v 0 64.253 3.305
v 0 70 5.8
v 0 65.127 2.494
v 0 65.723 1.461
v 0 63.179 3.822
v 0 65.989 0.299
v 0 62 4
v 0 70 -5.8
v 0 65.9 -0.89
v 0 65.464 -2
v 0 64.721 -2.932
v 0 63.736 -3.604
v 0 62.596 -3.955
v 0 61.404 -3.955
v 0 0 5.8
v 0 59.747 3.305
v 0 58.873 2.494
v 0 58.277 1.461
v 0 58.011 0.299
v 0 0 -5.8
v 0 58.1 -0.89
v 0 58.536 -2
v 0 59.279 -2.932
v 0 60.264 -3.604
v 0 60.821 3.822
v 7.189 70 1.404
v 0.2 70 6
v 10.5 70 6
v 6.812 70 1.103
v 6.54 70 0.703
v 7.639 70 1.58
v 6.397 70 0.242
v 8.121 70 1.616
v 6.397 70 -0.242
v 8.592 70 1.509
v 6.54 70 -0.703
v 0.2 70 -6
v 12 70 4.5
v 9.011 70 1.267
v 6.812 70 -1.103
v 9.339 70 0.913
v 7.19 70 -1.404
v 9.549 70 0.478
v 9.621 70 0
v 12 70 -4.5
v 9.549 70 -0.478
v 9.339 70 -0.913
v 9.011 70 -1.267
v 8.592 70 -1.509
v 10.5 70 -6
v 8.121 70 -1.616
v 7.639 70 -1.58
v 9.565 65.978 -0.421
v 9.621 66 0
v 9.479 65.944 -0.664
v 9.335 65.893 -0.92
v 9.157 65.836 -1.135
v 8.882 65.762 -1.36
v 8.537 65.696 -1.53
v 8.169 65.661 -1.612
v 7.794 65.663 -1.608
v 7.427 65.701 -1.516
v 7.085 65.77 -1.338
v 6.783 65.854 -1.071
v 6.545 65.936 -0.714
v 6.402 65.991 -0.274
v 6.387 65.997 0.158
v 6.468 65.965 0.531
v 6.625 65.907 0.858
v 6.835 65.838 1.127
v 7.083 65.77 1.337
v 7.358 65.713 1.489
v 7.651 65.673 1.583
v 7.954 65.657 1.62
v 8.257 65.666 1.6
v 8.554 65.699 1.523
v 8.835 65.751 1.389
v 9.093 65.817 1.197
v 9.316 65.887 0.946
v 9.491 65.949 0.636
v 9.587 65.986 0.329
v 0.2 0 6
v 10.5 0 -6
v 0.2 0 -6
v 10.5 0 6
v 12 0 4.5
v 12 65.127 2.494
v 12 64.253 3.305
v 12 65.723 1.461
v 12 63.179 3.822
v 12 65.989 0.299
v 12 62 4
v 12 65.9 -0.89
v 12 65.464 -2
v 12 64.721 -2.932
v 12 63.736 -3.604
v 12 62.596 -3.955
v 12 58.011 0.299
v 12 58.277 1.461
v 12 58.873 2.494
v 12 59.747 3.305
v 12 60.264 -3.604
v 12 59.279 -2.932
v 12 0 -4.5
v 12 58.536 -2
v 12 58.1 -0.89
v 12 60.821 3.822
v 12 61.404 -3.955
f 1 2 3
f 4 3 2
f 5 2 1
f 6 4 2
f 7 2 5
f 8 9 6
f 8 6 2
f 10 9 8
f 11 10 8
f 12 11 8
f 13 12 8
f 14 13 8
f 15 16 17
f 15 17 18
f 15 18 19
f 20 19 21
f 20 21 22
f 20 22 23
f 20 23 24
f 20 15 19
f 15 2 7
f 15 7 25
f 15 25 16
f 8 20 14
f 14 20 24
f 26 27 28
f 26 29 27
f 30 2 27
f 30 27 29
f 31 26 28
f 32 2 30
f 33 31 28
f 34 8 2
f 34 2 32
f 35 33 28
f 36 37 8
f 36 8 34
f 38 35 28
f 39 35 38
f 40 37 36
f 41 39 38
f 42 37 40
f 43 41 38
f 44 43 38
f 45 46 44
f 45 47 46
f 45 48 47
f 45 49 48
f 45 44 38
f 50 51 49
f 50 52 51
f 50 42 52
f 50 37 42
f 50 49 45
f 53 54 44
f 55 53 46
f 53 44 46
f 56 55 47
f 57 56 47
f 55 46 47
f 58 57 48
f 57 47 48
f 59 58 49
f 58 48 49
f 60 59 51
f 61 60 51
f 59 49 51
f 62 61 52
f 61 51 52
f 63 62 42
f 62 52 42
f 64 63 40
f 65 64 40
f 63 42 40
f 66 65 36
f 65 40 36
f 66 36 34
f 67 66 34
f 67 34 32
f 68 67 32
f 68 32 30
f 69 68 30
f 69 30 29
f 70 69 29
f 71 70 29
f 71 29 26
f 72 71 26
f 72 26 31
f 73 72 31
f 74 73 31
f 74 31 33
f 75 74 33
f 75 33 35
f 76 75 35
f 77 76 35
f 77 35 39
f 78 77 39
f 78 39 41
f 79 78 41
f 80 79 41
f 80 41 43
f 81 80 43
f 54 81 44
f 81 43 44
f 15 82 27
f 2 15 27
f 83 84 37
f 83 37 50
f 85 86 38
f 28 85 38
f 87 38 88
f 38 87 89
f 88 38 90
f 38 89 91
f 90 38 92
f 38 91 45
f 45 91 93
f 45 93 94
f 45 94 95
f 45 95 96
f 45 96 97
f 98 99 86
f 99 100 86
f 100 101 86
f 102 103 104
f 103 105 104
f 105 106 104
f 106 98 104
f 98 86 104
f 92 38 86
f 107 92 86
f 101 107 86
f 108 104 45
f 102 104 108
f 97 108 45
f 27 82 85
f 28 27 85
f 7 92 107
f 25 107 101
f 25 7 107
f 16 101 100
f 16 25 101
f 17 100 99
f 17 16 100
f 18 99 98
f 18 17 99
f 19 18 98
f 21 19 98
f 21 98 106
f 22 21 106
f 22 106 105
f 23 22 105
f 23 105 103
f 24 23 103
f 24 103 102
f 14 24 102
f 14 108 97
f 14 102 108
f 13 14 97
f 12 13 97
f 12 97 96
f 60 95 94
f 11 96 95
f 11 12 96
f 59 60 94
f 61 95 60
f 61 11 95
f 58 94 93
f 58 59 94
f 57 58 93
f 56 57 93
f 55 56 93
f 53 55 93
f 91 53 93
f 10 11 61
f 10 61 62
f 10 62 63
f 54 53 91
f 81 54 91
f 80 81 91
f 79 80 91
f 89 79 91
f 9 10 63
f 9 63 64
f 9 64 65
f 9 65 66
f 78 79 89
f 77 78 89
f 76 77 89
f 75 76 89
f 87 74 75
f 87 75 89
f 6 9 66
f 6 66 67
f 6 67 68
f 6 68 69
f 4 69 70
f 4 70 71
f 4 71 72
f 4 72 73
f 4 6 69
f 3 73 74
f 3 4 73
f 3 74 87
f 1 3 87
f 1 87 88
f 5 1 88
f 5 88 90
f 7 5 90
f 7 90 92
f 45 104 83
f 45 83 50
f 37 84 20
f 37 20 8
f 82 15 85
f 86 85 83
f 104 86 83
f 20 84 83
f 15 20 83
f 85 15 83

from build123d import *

# Parameters (mm, degrees)
SKETCH1_W           = 12
SKETCH1_H           = 12
BOSS_EXTRUDE1_DEPTH = 70
CHAMFER1_SIZE       = 0.2
CHAMFER2_SIZE       = 1.5
SKETCH2_R           = 4
CUT_EXTRUDE1_DEPTH  = 72.274118725
TAP1_REACH          = 73.274
TAP1_BORE_R         = 1.621


with BuildPart() as part:
    # Sketch1 → Boss-Extrude1 (new body)
    with BuildSketch(Plane(origin=(0, 0, 0), x_dir=(1, 0, 0), z_dir=(0, 1, 0))):
        with Locations((6, 0)):
            Rectangle(SKETCH1_W, SKETCH1_H)
    extrude(amount=BOSS_EXTRUDE1_DEPTH)

    # Chamfer1
    chamfer1_edges = [part.edges().sort_by_distance(p)[0] for p in [
        (0, 35, 6),
        (0, 35, -6),
    ]]
    chamfer(chamfer1_edges, length=CHAMFER1_SIZE)

    # Chamfer2
    chamfer2_edges = [part.edges().sort_by_distance(p)[0] for p in [
        (12, 35, -6),
        (12, 35, 6),
    ]]
    chamfer(chamfer2_edges, length=CHAMFER2_SIZE)

    # Sketch2 → Cut-Extrude1 (cut, through all)
    with BuildSketch(Plane(origin=(0, 0, 0), x_dir=(0, 0, -1), z_dir=(1, 0, 0))):
        with Locations(Location((0, 62, 0), (0, 0, 180))):
            Circle(SKETCH2_R)
    extrude(amount=CUT_EXTRUDE1_DEPTH, mode=Mode.SUBTRACT)

    # Tap1 bore → Tap1 (cut, up to next)
    with BuildSketch(Plane(origin=(0, 70, 0), x_dir=(1, 0, 0), z_dir=(0, 1, 0)), mode=Mode.PRIVATE) as tap1_sk1:
        with Locations((8, 0)):
            Circle(TAP1_BORE_R)
    tap1_tool1 = extrude(tap1_sk1.sketch, amount=-TAP1_REACH, mode=Mode.PRIVATE) & part.part
    add(tap1_tool1.solids().sort_by_distance((8, 70, 0))[0], mode=Mode.SUBTRACT)


solid = part.part
